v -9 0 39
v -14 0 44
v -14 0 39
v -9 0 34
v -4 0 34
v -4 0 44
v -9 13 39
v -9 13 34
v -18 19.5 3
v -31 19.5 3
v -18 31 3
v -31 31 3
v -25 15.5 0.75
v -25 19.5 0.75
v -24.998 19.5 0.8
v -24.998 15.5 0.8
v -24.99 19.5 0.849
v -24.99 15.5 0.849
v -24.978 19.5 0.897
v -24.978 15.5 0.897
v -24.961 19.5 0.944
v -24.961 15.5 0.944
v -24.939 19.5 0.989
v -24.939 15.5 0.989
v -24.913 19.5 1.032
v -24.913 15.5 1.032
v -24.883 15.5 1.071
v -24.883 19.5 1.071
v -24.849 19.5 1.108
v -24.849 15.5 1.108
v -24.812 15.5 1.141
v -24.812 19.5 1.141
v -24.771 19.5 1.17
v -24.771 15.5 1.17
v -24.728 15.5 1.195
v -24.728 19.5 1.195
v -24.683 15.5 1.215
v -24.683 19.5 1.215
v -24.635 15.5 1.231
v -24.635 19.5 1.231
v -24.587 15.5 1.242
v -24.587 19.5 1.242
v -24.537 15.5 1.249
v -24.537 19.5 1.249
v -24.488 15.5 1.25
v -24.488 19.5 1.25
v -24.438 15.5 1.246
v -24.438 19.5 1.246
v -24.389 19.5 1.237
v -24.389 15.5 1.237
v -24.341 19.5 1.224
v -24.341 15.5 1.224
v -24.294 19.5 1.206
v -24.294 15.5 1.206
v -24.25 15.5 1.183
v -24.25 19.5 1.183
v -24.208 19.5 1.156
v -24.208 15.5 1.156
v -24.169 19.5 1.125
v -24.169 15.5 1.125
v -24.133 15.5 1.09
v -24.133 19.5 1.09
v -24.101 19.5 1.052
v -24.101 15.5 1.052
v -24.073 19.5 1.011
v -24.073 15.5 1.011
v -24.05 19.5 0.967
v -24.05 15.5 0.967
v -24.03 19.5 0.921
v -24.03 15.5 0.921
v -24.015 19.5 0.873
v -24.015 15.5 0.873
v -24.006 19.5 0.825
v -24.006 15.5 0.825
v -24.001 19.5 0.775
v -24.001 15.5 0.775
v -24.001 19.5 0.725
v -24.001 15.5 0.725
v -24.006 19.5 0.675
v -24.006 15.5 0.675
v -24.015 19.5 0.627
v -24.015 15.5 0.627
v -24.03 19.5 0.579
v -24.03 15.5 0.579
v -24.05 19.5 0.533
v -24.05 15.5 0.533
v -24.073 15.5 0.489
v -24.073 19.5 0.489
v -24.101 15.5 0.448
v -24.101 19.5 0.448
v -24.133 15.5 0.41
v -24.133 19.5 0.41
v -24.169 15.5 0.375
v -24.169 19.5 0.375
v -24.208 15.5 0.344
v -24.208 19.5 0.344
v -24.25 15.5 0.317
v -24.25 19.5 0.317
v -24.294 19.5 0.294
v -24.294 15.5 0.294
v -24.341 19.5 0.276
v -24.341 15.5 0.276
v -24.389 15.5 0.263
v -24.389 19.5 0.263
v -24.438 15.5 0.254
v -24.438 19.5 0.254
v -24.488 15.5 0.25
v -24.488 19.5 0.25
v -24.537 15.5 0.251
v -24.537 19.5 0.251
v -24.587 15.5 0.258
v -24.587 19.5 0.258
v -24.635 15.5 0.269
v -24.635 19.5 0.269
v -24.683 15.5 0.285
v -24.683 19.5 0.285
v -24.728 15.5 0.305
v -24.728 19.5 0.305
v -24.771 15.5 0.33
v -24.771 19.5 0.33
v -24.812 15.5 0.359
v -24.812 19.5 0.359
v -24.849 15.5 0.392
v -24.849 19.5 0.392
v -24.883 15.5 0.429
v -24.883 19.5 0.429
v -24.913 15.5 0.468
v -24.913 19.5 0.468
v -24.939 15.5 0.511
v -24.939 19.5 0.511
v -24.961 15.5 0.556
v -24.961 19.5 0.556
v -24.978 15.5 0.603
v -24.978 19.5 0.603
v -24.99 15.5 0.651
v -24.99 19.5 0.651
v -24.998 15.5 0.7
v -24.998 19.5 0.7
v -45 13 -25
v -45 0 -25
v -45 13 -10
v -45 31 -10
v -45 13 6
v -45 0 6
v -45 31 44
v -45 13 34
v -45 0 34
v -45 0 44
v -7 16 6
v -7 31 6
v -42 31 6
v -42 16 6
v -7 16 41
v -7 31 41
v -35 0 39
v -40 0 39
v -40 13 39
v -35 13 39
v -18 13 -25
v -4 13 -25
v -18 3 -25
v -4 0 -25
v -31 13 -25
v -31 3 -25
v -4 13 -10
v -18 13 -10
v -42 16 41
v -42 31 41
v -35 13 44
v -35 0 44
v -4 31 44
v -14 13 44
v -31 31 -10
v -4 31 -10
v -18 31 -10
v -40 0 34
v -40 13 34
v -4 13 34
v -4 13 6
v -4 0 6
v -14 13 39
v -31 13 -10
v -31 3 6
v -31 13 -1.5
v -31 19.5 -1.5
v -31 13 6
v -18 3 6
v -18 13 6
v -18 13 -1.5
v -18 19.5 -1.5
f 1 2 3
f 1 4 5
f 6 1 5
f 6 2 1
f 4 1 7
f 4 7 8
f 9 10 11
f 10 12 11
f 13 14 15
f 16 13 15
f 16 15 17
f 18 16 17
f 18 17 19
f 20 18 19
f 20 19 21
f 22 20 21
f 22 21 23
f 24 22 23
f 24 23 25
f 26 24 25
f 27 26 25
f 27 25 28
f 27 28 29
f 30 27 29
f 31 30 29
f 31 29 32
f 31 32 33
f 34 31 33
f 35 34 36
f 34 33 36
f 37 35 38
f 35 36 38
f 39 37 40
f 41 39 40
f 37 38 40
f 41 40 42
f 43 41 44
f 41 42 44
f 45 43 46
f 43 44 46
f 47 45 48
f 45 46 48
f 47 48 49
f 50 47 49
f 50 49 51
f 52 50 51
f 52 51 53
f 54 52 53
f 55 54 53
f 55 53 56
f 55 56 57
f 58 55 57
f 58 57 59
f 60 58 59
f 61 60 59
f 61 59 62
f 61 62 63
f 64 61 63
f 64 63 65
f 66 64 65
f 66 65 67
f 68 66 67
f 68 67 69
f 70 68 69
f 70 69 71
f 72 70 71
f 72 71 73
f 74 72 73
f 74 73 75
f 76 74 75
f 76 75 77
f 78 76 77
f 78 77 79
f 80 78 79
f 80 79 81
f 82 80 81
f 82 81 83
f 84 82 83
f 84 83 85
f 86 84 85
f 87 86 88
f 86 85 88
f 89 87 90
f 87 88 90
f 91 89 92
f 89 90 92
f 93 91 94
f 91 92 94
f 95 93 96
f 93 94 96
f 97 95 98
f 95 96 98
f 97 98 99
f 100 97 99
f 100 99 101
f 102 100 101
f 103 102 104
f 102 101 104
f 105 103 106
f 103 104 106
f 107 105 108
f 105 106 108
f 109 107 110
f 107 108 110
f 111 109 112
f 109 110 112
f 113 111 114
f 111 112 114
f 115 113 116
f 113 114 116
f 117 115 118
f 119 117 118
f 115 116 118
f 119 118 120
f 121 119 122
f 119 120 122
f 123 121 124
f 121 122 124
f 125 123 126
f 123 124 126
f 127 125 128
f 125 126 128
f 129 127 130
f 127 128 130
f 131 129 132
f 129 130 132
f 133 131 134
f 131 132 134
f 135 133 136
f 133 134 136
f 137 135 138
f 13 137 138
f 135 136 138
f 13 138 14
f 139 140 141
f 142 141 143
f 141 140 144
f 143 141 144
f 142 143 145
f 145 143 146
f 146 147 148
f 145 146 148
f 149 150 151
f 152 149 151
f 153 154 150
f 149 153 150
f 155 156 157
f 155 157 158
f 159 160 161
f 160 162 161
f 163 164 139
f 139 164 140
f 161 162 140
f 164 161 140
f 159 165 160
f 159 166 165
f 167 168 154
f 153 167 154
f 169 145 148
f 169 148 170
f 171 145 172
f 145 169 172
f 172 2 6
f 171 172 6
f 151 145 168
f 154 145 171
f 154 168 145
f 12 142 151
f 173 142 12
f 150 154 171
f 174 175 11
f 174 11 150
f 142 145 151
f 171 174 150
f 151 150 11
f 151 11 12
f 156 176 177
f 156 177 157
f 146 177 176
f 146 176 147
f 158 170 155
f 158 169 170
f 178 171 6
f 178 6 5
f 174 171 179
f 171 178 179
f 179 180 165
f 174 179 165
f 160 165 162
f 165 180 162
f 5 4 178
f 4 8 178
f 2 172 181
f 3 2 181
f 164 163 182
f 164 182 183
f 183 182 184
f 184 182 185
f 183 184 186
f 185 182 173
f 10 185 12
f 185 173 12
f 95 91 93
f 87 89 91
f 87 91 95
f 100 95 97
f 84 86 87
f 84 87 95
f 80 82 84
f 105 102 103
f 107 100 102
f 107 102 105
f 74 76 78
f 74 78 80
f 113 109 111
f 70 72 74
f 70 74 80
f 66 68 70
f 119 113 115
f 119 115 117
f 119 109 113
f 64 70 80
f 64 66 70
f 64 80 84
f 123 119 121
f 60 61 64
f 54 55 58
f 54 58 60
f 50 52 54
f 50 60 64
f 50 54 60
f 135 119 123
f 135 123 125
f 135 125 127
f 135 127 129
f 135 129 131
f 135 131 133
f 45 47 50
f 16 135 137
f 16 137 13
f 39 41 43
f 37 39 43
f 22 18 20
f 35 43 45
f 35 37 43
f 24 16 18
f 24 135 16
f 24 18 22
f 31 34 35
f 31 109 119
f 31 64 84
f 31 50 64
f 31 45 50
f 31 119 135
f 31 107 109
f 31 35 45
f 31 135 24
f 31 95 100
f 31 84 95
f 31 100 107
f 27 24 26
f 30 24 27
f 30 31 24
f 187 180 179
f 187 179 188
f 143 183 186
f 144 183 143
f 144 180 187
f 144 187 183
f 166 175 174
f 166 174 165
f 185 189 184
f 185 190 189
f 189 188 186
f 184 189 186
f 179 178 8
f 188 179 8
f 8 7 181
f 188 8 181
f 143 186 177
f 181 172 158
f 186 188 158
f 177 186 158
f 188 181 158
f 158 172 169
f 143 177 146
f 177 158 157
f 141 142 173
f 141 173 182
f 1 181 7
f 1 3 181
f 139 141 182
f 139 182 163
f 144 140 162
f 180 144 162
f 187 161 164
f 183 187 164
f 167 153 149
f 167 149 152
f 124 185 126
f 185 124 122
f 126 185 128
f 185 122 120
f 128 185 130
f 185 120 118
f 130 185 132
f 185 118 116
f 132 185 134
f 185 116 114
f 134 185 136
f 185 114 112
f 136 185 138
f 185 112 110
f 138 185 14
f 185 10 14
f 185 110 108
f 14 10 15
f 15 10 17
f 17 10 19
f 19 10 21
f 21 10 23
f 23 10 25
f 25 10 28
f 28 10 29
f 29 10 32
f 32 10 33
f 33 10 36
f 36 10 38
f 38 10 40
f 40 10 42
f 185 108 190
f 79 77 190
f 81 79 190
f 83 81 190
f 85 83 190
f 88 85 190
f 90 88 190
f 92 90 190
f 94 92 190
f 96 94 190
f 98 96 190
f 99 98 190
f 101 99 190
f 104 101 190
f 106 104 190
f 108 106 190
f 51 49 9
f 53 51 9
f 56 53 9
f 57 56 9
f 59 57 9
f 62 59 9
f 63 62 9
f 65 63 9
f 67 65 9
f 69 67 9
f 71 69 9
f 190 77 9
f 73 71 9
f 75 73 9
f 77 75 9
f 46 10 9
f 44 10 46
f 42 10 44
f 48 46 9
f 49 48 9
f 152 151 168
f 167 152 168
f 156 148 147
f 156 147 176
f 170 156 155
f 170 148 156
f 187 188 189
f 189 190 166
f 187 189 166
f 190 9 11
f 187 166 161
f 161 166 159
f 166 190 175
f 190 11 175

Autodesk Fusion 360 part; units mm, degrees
sketch "Boceto1" plane through (0, 0, 0) normal (0, 1, 0) x (1, 0, 0)
  line L0 (-45, 25) -> (-4, 25)
  line L1 (-45, 25) -> (-45, -44)
  line L2 (-45, -44) -> (-4, -44)
  line L3 (-4, -44) -> (-4, 25)
  dimension "d1" = 41
  dimension "d2" = 69
extrude "Extruir1" add sketch "Boceto1" along normal blind 31
sketch "Boceto2" plane through (0, 31, 0) normal (0, 1, 0) x (-1, 0, 0)
  line L0 (45, -25) -> (45, 44)
  line L1 (45, 44) -> (4, 44)
  line L2 (4, 44) -> (4, -25)
  line L3 (4, -25) -> (45, -25)
  line L4 (42, 41) -> (42, 31.833)
  line L5 (42, 41) -> (7, 41)
  line L6 (7, 41) -> (7, 6)
  line L7 (7, 6) -> (42, 6)
  line L8 (42, 6) -> (42, 31.833)
  dimension "d7" = 35
  dimension "d8" = 35
extrude "Extruir2" cut sketch "Boceto2" against normal blind 15 contours L4 L5 L6 L7 L8
sketch "Boceto3" plane through (0, 0, 44) normal (0, 0, 1) x (1, 0, 0)
  line L0 (-45, 0) -> (-4, 0)
  line L1 (-4, 0) -> (-4, 31)
  line L2 (-4, 31) -> (-45, 31)
  line L3 (-45, 31) -> (-45, 0)
  line L4 (-45, 0) -> (-45, 13)
  line L5 (-45, 13) -> (-4, 13)
  line L6 (-4, 13) -> (-4, 0)
  dimension "d11" = 13
extrude "Extruir3" cut sketch "Boceto3" against normal blind 38 contours L0 L1 L3 L4 L5 L6
sketch "Boceto4" plane through (0, 31, 0) normal (0, 1, 0) x (-1, 0, 0)
  line L0 (7, 6) -> (7, 41)
  line L1 (7, 41) -> (42, 41)
  line L2 (42, 41) -> (42, 6)
  line L3 (42, 6) -> (7, 6)
  line L4 (45, -25) -> (45, 44)
  line L5 (45, 44) -> (4, 44)
  line L6 (4, 44) -> (4, -25)
  line L7 (4, -25) -> (45, -25)
  line L8 (31, -25) -> (18, -25)
  line L9 (31, -25) -> (31, 3)
  line L10 (31, 3) -> (18, 3)
  line L11 (18, 3) -> (18, -25)
  dimension "d14" = 14
  dimension "d15" = 13
  dimension "d16" = 28
extrude "Extruir4" cut sketch "Boceto4" against normal blind 28 contours L7 L8 L9 L10 L11
sketch "Boceto5" plane through (-45, 0, 0) normal (-1, 0, 0) x (0, 0, 1)
  line L0 (6, 0) -> (6, 13)
  line L1 (6, 13) -> (44, 13)
  line L2 (44, 13) -> (44, 31)
  line L3 (44, 31) -> (-25, 31)
  line L4 (-25, 31) -> (-25, 0)
  line L5 (-25, 0) -> (6, 0)
  line L6 (-25, 31) -> (-10, 31)
  line L7 (-10, 31) -> (-10, 13)
  line L8 (-10, 13) -> (-25, 13)
  line L9 (-25, 13) -> (-25, 31)
  dimension "d19" = 15
  dimension "d20" = 18
extrude "Extruir5" cut sketch "Boceto5" against normal blind 50 contours L3 L4 L6 L7 L8 L9
sketch "Boceto6" plane through (0, 0, 6) normal (0, 0, 1) x (1, 0, 0)
  line L0 (-45, 0) -> (-4, 0)
  line L1 (-4, 0) -> (-4, 13)
  line L2 (-4, 13) -> (-45, 13)
  line L3 (-45, 13) -> (-45, 0)
  line L4 (-31, 13) -> (-18, 13)
  line L5 (-18, 13) -> (-18, 3)
  line L6 (-18, 3) -> (-31, 3)
  line L7 (-31, 3) -> (-31, 13)
  dimension "d23" = 14
  dimension "d24" = 13
  dimension "d25" = 10
extrude "Extruir6" cut sketch "Boceto6" against normal blind 30 contours L2 L4 L5 L6 L7
sketch "Boceto7" plane through (0, 0, 3) normal (0, 0, -1) x (-1, 0, 0)
  line L0 (18, 13) -> (31, 13)
  line L1 (31, 13) -> (31, 31)
  line L2 (31, 31) -> (18, 31)
  line L3 (18, 31) -> (18, 13)
  line L4 (18, 13) -> (31, 13)
  line L5 (31, 13) -> (31, 22.5)
  line L6 (31, 22.5) -> (18, 22.5)
  line L7 (18, 22.5) -> (18, 13)
  dimension "d28" = 9.5
extrude "Extruir7" add sketch "Boceto7" along normal blind 4.5 contours L0 L1 L3 L4 L5 L6 L7
sketch "Boceto8" plane through (0, 13, 0) normal (0, -1, 0) x (1, 0, 0)
  line L0 (-4, 44) -> (-45, 44)
  line L1 (-45, 44) -> (-45, 6)
  line L2 (-45, 6) -> (-31, 6)
  line L3 (-31, 6) -> (-31, -1.5)
  line L4 (-31, -1.5) -> (-18, -1.5)
  line L5 (-18, -1.5) -> (-18, 6)
  line L6 (-18, 6) -> (-4, 6)
  line L7 (-4, 6) -> (-4, 44)
  line L8 (-45, 44) -> (-35, 44)
  line L9 (-35, 44) -> (-35, 34)
  line L10 (-35, 34) -> (-45, 34)
  line L11 (-45, 34) -> (-45, 44)
  line L12 (-4, 44) -> (-14, 44)
  line L13 (-14, 44) -> (-14, 34)
  line L14 (-14, 34) -> (-4, 34)
  line L15 (-4, 34) -> (-4, 44)
extrude "Extruir8" add sketch "Boceto8" along normal blind 13 contours L0 L7 L12 L13 L14 L15 | L0 L1 L8 L9 L10 L11
sketch "Boceto9" plane through (0, 0, 0) normal (0, -1, 0) x (1, 0, 0)
  line L0 (-45, 34) -> (-35, 34)
  line L1 (-35, 34) -> (-35, 44)
  line L2 (-35, 44) -> (-45, 44)
  line L3 (-45, 44) -> (-45, 34)
  line L4 (-40, 34) -> (-40, 39)
  line L5 (-40, 39) -> (-35, 39)
  line L6 (-35, 34) -> (-40, 34)
  line L7 (-14, 34) -> (-9, 34)
  line L8 (-14, 34) -> (-14, 39)
  line L9 (-14, 39) -> (-9, 39)
  line L10 (-9, 39) -> (-9, 34)
extrude "Extruir9" cut sketch "Boceto9" against normal blind 13 contours L0 L1 L4 L5 L6 | L7 L8 L9 L10
sketch "Boceto10" plane through (0, 22.5, 0) normal (0, 1, 0) x (-1, 0, 0)
  line L0 (31, 3) -> (18, 3)
  line L1 (18, 3) -> (18, -1.5)
  line L2 (18, -1.5) -> (31, -1.5)
  line L3 (31, -1.5) -> (31, 3)
  circle A0 centre (24.5, 0.75) radius 0.5
  dimension "d35" = 1
extrude "Extruir10" cut sketch "Boceto10" against normal blind 4 contours A0
extrude "Extruir11" add 1 faces at (-22.3333, 3, -14.6667) along direction (0, 1, 0) blind 3
extrude "Extruir12" cut 1 faces at (-22.3333, 6, -14.6667) along direction (0, -1, 0) blind 3
extrude "Extruir13" cut 1 faces at (-29, 22.5, 0.75) along direction (0, -1, 0) blind 3
extrude "Extruir14" cut 1 faces at (-24.1479, 18.5, 0.7889) along direction (0, -1, 0) blind 3
